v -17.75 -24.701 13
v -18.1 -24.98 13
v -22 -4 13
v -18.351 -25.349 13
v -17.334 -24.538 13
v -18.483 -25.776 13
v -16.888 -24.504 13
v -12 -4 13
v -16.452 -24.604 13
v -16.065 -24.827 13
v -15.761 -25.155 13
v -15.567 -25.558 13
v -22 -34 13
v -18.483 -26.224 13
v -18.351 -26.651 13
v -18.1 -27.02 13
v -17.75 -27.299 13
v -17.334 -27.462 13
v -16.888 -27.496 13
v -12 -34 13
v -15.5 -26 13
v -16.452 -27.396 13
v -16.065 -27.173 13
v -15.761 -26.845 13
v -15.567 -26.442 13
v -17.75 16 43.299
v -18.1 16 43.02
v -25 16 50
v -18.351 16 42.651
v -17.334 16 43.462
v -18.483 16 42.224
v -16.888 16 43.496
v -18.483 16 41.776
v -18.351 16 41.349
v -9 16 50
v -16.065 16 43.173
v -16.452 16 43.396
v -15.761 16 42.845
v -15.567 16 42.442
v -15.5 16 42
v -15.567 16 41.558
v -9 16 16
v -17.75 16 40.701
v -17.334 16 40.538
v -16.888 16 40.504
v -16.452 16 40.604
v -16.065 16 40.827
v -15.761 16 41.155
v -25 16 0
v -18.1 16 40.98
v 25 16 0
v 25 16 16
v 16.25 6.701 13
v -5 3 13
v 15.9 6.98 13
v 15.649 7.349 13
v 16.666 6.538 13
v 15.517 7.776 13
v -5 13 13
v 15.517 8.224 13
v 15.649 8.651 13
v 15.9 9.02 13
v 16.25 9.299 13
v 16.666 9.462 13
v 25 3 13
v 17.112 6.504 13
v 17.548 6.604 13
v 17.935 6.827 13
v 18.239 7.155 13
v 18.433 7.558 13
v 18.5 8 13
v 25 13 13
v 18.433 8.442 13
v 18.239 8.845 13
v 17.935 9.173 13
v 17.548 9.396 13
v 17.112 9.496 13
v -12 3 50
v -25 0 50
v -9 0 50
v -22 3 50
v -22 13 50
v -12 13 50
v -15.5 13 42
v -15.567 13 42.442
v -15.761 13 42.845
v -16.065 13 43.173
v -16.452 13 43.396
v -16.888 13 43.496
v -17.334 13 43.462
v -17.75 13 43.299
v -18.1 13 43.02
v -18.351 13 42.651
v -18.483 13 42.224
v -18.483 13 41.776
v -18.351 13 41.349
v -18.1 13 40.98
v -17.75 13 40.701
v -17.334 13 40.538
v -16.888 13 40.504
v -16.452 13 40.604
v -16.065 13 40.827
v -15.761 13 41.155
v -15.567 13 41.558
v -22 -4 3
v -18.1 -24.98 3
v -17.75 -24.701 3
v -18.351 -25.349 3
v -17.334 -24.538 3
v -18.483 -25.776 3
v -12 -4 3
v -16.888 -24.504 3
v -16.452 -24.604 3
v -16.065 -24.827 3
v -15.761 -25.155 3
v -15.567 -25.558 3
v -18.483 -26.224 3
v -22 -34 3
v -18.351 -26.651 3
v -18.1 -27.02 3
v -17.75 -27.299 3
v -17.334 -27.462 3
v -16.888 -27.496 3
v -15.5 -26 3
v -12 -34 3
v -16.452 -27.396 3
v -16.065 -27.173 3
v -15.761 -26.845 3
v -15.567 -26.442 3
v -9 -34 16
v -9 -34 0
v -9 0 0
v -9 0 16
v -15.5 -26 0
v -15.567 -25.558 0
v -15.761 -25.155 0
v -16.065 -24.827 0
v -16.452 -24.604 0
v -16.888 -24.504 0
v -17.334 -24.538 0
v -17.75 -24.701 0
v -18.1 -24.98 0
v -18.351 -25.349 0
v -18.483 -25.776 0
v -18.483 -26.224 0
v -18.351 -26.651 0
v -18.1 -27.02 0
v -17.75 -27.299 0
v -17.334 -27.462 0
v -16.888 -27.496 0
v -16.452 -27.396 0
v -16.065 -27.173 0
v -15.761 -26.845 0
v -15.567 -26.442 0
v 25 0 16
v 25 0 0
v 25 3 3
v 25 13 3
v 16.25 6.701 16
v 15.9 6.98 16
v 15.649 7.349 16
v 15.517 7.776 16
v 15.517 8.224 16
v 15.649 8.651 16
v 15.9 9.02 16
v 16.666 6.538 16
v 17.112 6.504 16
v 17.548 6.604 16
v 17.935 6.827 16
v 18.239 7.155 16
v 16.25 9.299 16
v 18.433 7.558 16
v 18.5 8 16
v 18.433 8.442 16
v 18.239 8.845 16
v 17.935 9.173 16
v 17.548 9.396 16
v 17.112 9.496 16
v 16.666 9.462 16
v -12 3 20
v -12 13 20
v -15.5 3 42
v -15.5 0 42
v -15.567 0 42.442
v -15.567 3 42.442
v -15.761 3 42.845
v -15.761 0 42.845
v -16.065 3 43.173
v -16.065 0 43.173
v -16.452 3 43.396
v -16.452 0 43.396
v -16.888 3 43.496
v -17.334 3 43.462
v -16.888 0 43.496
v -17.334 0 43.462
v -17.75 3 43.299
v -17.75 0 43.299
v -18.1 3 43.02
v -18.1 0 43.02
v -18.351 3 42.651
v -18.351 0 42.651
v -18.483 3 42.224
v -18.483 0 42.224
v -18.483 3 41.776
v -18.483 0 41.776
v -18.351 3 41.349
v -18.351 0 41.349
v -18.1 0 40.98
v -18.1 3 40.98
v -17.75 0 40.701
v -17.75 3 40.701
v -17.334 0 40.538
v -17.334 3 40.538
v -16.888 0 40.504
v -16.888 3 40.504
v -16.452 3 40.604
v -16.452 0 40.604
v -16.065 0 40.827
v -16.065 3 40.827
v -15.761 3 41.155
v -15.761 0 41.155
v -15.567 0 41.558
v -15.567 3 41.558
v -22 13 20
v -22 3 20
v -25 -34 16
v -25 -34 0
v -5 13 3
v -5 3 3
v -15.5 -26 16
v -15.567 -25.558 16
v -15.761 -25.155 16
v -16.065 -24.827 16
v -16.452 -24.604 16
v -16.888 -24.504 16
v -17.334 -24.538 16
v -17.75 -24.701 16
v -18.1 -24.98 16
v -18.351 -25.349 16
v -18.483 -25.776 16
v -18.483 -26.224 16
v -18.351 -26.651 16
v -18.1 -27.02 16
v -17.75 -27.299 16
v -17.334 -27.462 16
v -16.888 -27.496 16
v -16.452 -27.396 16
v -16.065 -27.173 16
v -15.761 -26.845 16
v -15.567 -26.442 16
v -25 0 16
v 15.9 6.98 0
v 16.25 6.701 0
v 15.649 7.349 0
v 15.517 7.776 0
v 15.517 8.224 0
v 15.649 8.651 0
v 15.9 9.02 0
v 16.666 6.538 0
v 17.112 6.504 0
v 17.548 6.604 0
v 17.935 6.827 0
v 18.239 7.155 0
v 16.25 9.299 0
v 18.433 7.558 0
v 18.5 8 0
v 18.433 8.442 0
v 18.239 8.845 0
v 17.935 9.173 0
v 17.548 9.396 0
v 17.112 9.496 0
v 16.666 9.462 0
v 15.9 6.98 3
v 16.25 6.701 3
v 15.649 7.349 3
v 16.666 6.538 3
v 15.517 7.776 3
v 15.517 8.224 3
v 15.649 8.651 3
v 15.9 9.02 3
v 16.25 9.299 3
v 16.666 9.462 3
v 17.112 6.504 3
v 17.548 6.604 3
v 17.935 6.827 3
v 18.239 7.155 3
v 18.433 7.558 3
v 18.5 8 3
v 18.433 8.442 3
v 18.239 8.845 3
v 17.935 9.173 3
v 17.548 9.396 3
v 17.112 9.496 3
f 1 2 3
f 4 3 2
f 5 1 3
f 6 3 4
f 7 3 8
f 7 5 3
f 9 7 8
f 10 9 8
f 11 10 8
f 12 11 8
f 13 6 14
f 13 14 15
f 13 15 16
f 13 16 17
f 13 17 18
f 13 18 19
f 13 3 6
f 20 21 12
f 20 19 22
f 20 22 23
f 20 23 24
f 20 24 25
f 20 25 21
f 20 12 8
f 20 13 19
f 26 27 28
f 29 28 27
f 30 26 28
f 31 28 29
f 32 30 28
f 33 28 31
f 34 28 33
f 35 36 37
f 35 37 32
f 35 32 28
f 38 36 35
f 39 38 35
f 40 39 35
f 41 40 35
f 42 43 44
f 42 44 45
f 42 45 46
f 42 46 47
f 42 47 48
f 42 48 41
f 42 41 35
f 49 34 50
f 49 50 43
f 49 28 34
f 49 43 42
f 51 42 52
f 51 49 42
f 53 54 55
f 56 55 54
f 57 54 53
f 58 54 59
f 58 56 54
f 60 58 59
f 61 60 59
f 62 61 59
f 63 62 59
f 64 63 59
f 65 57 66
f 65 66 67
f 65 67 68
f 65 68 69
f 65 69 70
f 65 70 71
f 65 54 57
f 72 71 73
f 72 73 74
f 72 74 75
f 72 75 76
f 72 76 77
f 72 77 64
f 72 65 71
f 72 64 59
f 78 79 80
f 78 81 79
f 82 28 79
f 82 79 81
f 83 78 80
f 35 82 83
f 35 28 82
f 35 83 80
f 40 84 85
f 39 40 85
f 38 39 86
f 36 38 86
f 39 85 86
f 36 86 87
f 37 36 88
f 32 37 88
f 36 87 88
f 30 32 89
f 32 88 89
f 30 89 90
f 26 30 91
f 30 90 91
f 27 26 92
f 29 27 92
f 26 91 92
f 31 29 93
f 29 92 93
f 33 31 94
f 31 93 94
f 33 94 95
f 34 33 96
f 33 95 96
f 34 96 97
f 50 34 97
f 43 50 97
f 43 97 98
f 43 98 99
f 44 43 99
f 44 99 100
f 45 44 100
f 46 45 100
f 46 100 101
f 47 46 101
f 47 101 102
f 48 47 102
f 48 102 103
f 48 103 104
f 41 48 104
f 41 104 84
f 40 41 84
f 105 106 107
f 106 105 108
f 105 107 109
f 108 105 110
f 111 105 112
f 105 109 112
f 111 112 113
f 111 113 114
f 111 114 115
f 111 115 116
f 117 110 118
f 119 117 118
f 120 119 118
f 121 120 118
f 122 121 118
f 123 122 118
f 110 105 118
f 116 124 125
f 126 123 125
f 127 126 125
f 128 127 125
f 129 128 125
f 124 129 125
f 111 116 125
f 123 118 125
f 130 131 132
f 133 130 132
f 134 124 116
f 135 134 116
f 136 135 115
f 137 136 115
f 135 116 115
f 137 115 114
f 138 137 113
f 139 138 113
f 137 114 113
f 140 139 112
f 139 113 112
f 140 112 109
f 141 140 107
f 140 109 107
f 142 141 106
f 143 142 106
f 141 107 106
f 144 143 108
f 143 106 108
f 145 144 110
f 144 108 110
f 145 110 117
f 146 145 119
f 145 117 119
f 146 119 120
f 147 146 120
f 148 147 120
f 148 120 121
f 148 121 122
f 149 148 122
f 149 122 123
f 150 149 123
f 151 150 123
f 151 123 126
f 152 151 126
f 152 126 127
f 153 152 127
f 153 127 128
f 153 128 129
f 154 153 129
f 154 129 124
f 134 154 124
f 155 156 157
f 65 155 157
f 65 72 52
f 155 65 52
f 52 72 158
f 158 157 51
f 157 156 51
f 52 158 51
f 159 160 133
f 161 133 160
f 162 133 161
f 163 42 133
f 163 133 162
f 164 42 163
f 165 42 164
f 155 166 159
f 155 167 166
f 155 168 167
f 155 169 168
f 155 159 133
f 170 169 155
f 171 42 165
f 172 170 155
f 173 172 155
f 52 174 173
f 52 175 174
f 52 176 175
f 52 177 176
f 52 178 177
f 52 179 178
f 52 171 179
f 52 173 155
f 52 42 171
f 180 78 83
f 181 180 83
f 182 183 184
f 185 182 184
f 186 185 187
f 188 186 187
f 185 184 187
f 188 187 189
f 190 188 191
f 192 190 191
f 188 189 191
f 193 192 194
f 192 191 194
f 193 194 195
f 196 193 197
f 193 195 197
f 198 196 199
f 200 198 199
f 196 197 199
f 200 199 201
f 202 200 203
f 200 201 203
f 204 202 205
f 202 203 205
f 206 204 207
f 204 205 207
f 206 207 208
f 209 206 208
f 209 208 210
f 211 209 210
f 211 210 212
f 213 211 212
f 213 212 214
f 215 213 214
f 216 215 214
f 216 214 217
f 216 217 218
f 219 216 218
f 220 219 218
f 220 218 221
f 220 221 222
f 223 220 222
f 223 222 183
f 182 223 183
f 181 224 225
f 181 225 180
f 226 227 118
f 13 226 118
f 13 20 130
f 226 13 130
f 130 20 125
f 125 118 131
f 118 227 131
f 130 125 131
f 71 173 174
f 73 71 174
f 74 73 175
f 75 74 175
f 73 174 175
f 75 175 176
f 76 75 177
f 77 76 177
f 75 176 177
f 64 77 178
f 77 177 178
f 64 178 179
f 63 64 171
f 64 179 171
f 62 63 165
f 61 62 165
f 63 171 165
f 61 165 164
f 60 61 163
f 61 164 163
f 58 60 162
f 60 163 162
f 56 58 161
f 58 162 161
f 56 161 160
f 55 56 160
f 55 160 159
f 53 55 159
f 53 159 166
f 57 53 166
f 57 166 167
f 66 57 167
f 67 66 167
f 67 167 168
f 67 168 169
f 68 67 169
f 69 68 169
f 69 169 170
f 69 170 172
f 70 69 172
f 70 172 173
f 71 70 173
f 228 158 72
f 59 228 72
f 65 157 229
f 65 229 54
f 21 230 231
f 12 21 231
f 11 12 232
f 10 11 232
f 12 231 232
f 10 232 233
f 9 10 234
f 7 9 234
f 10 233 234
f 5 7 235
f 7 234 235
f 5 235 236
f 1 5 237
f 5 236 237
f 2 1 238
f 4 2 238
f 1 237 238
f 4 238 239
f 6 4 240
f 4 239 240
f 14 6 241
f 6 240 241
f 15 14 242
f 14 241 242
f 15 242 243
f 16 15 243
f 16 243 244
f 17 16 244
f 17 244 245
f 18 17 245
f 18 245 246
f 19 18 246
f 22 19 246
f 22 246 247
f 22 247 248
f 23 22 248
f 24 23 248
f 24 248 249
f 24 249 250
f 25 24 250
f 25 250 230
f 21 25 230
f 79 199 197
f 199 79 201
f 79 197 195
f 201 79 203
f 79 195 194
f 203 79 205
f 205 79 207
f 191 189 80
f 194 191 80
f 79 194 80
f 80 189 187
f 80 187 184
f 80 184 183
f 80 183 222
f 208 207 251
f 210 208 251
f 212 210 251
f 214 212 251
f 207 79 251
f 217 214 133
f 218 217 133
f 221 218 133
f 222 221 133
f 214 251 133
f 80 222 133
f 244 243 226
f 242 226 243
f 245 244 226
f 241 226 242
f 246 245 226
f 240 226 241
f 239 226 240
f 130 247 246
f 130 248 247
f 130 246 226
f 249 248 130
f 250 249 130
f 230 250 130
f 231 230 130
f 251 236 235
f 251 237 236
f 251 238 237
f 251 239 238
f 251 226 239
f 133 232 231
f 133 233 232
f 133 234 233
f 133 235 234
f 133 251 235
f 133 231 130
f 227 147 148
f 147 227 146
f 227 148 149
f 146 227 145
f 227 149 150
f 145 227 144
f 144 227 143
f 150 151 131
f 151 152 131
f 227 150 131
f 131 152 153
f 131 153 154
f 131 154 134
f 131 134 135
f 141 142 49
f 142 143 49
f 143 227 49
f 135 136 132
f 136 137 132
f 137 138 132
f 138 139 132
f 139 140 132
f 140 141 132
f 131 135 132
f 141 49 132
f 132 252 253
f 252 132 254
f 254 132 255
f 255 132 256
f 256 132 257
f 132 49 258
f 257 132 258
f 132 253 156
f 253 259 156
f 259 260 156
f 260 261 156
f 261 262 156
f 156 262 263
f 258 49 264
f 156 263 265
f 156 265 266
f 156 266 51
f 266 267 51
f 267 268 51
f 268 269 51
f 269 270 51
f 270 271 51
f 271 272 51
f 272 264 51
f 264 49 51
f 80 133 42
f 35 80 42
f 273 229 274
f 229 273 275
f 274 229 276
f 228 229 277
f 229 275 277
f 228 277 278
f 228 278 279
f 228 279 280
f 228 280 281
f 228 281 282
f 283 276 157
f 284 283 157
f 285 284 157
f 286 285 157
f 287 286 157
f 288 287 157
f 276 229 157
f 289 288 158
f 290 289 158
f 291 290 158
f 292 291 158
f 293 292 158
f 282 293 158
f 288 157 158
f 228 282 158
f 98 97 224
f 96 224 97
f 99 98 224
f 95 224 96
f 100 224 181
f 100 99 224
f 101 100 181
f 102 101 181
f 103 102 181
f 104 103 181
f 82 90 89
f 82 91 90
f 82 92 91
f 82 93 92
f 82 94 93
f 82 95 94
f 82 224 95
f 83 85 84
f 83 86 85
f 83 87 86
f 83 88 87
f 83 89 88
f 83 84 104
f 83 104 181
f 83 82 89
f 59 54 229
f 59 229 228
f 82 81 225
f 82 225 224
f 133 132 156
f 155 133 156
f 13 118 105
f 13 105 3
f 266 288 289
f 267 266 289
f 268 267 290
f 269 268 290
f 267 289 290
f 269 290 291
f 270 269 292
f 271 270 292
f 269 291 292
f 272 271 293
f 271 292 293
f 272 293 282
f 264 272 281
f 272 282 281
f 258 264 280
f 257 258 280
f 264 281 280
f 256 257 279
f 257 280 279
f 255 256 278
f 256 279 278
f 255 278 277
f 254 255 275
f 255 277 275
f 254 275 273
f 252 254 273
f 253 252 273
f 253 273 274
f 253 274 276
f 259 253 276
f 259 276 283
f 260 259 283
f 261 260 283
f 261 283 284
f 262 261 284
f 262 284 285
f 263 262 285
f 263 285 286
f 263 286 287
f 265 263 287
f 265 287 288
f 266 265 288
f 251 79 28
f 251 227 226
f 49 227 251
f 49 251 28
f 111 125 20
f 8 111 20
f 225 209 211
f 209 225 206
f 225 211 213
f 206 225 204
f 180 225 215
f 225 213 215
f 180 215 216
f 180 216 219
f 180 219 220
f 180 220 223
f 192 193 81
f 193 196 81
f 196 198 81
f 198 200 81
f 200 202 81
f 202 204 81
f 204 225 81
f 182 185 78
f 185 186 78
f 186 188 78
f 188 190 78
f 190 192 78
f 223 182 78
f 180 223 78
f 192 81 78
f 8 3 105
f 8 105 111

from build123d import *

# Parameters (mm, degrees)
F0_W      = 16
F0_H      = 34
F1_DEPTH  = 16
F2_W      = 10
F2_H      = 10
F3_DEPTH  = 30
F4_W      = 10
F4_H      = 10
F5_DEPTH  = 30
F6_R      = 1.5
F7_DEPTH  = 16
F8_W      = 16
F8_H      = 16
F9_DEPTH  = 34
F10_W     = 10
F10_H     = 10
F11_DEPTH = 30
F12_R     = 1.5
F13_DEPTH = 16


with BuildPart() as f1:
    # F0 (on Top) → F1 (new body)
    with BuildSketch(Plane.XY):
        Polygon((25, 16), (-25, 16), (-25, 0), (-9, 0), (25, 0), align=None)
        with Locations((-17, -17)):
            Rectangle(F0_W, F0_H)
    extrude(amount=F1_DEPTH)

    # F2 (on face) → F3 (cut)
    with BuildSketch(Plane.YZ.offset(25)):
        with Locations((8, 8)):
            Rectangle(F2_W, F2_H)
    extrude(amount=-F3_DEPTH, mode=Mode.SUBTRACT)

    # F4 (on face) → F5 (cut)
    with BuildSketch(Plane.XZ.offset(34)):
        with Locations((-17, 8)):
            Rectangle(F4_W, F4_H)
    extrude(amount=-F5_DEPTH, mode=Mode.SUBTRACT)

    # F6 (on face) → F7 (cut)
    with BuildSketch(Plane.XY.offset(16)):
        with Locations((-17, -26)):
            Circle(F6_R)
        with Locations((17, 8)):
            Circle(F6_R)
    extrude(amount=-F7_DEPTH, mode=Mode.SUBTRACT)

    # F8 (on face) → F9 (join)
    with BuildSketch(Plane.XY.offset(16)):
        with Locations((-17, 8)):
            Rectangle(F8_W, F8_H)
    extrude(amount=F9_DEPTH)

    # F10 (on face) → F11 (cut)
    with BuildSketch(Plane.XY.offset(50)):
        with Locations((-17, 8)):
            Rectangle(F10_W, F10_H)
    extrude(amount=-F11_DEPTH, mode=Mode.SUBTRACT)

    # F12 (on face) → F13 (cut)
    with BuildSketch(Plane.XZ):
        with Locations((-17, 42)):
            Circle(F12_R)
    extrude(amount=-F13_DEPTH, mode=Mode.SUBTRACT)


solid = f1.part
